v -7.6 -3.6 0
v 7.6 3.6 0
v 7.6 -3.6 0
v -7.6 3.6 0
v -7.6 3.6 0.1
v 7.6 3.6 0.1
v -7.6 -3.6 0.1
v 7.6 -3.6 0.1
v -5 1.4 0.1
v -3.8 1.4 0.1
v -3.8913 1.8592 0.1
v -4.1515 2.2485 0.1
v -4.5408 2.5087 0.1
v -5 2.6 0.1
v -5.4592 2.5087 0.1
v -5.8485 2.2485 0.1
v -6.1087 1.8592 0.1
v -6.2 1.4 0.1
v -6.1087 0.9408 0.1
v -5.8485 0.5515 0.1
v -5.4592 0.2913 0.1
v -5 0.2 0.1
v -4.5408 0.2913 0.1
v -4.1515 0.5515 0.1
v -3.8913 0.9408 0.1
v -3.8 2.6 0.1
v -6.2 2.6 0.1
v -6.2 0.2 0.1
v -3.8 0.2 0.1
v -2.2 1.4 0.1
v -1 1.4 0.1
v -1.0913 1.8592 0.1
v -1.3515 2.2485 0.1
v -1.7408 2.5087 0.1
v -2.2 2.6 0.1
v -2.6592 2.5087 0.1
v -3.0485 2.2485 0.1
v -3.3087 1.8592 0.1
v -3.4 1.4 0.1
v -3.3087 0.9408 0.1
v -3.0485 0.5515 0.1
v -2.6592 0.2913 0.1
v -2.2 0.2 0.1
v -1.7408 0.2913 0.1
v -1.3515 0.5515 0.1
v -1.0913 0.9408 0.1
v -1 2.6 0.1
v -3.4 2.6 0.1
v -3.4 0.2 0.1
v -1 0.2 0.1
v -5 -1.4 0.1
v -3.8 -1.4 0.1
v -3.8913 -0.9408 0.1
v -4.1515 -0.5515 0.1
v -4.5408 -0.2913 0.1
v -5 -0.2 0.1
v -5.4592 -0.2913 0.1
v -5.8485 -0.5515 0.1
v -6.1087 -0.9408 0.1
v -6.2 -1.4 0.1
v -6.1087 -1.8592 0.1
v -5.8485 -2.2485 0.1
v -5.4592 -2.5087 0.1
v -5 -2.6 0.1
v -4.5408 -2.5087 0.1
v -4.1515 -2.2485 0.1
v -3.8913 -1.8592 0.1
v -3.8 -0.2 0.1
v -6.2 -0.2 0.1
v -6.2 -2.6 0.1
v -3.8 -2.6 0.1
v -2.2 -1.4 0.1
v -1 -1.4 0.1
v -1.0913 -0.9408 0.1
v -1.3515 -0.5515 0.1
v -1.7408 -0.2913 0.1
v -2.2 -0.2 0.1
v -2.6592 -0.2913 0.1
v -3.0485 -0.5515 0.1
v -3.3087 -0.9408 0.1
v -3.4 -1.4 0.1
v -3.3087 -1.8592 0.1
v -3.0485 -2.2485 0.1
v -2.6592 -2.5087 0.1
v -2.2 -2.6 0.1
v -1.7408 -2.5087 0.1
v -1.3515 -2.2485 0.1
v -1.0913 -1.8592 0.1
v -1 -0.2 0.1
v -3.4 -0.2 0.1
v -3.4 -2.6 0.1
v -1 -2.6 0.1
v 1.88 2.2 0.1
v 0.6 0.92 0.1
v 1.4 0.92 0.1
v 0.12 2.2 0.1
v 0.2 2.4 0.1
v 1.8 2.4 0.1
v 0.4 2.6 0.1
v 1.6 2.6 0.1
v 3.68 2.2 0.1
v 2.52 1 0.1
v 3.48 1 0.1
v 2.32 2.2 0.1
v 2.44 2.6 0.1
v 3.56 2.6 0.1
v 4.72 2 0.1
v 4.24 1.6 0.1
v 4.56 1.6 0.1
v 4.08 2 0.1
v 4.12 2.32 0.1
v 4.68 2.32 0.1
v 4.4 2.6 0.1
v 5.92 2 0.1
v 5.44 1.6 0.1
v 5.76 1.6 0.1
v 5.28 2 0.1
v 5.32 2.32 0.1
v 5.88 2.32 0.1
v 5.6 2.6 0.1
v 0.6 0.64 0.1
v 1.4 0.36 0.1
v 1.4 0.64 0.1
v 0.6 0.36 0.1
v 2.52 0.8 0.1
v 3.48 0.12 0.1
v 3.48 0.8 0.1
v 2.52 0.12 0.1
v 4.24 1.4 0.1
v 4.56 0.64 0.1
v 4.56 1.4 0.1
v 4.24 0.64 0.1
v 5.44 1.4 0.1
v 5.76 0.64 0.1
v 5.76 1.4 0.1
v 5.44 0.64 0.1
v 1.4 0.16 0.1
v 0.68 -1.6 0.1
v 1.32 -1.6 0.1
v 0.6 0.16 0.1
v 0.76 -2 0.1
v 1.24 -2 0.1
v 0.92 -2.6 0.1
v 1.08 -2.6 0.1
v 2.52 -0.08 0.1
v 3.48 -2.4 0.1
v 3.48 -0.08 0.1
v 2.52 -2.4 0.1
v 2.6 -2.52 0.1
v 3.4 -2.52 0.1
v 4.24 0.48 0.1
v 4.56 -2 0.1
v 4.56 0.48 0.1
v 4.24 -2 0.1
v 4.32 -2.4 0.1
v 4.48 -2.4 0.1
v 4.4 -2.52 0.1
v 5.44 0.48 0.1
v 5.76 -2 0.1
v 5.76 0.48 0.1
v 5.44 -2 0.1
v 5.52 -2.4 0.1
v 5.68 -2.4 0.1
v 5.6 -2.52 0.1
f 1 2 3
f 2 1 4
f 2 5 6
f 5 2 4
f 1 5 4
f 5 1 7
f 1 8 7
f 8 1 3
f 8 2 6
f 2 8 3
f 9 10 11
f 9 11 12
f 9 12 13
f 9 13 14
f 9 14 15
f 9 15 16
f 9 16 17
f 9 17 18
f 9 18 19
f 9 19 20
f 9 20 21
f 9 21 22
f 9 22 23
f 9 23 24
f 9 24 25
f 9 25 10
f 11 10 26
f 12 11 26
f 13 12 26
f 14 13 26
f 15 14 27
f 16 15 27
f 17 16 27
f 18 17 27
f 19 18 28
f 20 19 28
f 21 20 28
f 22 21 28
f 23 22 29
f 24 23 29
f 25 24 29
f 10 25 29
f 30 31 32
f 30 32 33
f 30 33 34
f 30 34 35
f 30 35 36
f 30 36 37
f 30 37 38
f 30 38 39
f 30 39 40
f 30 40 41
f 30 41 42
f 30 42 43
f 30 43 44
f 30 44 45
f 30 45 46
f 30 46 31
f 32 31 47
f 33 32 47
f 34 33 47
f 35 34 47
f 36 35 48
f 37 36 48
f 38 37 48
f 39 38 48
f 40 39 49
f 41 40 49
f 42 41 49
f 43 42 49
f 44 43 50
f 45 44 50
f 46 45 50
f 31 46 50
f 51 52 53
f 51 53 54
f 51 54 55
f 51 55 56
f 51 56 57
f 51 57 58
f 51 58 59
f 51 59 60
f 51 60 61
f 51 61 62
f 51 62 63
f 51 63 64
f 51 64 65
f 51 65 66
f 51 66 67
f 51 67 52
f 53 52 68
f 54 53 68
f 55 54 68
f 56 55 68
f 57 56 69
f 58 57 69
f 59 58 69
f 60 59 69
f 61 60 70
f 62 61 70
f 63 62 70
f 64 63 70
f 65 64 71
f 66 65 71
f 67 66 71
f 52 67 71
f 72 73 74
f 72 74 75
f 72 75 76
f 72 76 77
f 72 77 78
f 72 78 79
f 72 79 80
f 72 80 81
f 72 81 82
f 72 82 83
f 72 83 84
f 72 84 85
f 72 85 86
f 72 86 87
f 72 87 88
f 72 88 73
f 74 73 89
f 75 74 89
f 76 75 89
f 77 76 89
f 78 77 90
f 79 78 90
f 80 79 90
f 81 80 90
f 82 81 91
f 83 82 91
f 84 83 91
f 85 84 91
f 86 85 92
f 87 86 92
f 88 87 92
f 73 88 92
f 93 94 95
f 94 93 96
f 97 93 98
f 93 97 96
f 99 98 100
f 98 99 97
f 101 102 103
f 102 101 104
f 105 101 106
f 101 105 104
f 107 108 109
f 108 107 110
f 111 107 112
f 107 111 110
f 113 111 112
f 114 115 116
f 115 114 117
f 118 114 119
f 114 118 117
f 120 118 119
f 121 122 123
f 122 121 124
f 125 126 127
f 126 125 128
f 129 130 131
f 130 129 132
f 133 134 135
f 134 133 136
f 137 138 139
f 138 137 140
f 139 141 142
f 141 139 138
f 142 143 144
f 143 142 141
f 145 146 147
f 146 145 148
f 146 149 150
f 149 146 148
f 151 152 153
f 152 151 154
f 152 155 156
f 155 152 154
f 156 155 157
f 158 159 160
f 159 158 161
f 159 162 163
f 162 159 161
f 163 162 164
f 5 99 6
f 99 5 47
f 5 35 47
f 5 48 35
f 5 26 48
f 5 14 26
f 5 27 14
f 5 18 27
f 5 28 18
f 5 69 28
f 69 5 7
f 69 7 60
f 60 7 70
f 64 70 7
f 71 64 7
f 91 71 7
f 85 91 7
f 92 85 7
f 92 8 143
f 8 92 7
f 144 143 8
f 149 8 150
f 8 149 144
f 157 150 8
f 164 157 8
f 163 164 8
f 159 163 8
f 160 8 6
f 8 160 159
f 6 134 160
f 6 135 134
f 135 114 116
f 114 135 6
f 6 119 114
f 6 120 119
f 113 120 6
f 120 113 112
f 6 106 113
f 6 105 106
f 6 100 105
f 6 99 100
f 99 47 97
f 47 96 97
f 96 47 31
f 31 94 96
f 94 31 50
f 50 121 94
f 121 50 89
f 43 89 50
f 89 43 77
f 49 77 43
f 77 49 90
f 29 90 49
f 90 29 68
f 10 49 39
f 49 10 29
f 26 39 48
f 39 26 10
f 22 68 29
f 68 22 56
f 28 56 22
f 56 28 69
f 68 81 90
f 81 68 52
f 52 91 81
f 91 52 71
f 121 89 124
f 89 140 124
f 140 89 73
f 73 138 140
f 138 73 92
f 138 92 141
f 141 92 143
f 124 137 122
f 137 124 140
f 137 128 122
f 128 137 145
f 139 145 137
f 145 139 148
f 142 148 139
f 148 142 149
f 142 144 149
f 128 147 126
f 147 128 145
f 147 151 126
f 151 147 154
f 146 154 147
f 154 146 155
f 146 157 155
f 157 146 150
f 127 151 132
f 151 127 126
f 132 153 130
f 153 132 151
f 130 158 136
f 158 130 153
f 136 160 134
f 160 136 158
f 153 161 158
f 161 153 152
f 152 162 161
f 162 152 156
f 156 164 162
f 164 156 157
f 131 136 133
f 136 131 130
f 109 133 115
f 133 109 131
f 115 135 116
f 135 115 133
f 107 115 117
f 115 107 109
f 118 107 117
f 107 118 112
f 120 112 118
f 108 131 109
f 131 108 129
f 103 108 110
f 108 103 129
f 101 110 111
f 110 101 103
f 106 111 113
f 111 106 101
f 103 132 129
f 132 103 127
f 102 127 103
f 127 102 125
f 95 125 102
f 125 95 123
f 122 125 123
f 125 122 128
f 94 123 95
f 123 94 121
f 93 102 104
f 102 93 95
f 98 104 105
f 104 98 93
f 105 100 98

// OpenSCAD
// file: ../p/box5-12.scad
use <../lib.scad>
function ldraw_lib__box5_12() = [
// 0 Box with 5 Faces without Any Edges
// 0 Name: box5-12.dat
// 0 Author: Chris Dee [cwdee]
// 0 !LDRAW_ORG Primitive UPDATE 2009-02
// 0 !LICENSE Licensed under CC BY 4.0 : see CAreadme.txt
// 
// 0 BFC CERTIFY CCW
  [0,"BFC","CERTIFY"],
  [0,"BFC","CCW"],
// 
// 0 !HISTORY 2009-09-03 [PTadmin] Official Update 2009-02
// 
// 
// 4 16 1 1 1 1 1 -1 -1 1 -1 -1 1 1
  [4,16,1,1,1,1,1,-1,-1,1,-1,-1,1,1],
// 4 16 -1 0 1 1 0 1 1 1 1 -1 1 1
  [4,16,-1,0,1,1,0,1,1,1,1,-1,1,1],
// 4 16 -1 0 -1 -1 0 1 -1 1 1 -1 1 -1
  [4,16,-1,0,-1,-1,0,1,-1,1,1,-1,1,-1],
// 4 16 1 0 -1 -1 0 -1 -1 1 -1 1 1 -1
  [4,16,1,0,-1,-1,0,-1,-1,1,-1,1,1,-1],
// 4 16 1 0 1 1 0 -1 1 1 -1 1 1 1
  [4,16,1,0,1,1,0,-1,1,1,-1,1,1,1],
// 0
];
module ldraw_lib__box5_12(step=0, col=false, unit=2/5, alt=false, line=0.2, solid=!$preview)
    makepoly(ldraw_lib__box5_12(), step=step, col=col, unit=unit, alt=alt, line=line, solid=solid);
ldraw_lib__box5_12(line=0.2);
// file: ../p/4-4ndis.scad
use <../lib.scad>
function ldraw_lib__4_4ndis() = [
// 0 Disc Negative 1.0
// 0 Name: 4-4ndis.dat
// 0 Author: James Jessiman
// 0 !LDRAW_ORG Primitive UPDATE 2012-01
// 0 !LICENSE Licensed under CC BY 4.0 : see CAreadme.txt
// 
// 0 BFC CERTIFY CCW
  [0,"BFC","CERTIFY"],
  [0,"BFC","CCW"],
// 
// 0 !HISTORY 2002-03-23 [sbliss] Added BFC statement; compacted code
// 0 !HISTORY 2002-04-25 [PTadmin] Official Update 2002-02
// 0 !HISTORY 2007-06-24 [PTadmin] Header formatted for Contributor Agreement
// 0 !HISTORY 2008-07-01 [PTadmin] Official Update 2008-01
// 0 !HISTORY 2012-02-16 [Philo] Changed to CCW
// 0 !HISTORY 2012-03-30 [PTadmin] Official Update 2012-01
// 
// 
// 3 16 0.9239 0 0.3827 1 0 0 1 0 1
  [3,16,0.9239,0,0.3827,1,0,0,1,0,1],
// 3 16 0.7071 0 0.7071 0.9239 0 0.3827 1 0 1
  [3,16,0.7071,0,0.7071,0.9239,0,0.3827,1,0,1],
// 3 16 0.3827 0 0.9239 0.7071 0 0.7071 1 0 1
  [3,16,0.3827,0,0.9239,0.7071,0,0.7071,1,0,1],
// 3 16 0 0 1 0.3827 0 0.9239 1 0 1
  [3,16,0,0,1,0.3827,0,0.9239,1,0,1],
// 3 16 -0.3827 0 0.9239 0 0 1 -1 0 1
  [3,16,-0.3827,0,0.9239,0,0,1,-1,0,1],
// 3 16 -0.7071 0 0.7071 -0.3827 0 0.9239 -1 0 1
  [3,16,-0.7071,0,0.7071,-0.3827,0,0.9239,-1,0,1],
// 3 16 -0.9239 0 0.3827 -0.7071 0 0.7071 -1 0 1
  [3,16,-0.9239,0,0.3827,-0.7071,0,0.7071,-1,0,1],
// 3 16 -1 0 0 -0.9239 0 0.3827 -1 0 1
  [3,16,-1,0,0,-0.9239,0,0.3827,-1,0,1],
// 3 16 -0.9239 0 -0.3827 -1 0 0 -1 0 -1
  [3,16,-0.9239,0,-0.3827,-1,0,0,-1,0,-1],
// 3 16 -0.7071 0 -0.7071 -0.9239 0 -0.3827 -1 0 -1
  [3,16,-0.7071,0,-0.7071,-0.9239,0,-0.3827,-1,0,-1],
// 3 16 -0.3827 0 -0.9239 -0.7071 0 -0.7071 -1 0 -1
  [3,16,-0.3827,0,-0.9239,-0.7071,0,-0.7071,-1,0,-1],
// 3 16 0 0 -1 -0.3827 0 -0.9239 -1 0 -1
  [3,16,0,0,-1,-0.3827,0,-0.9239,-1,0,-1],
// 3 16 0.3827 0 -0.9239 0 0 -1 1 0 -1
  [3,16,0.3827,0,-0.9239,0,0,-1,1,0,-1],
// 3 16 0.7071 0 -0.7071 0.3827 0 -0.9239 1 0 -1
  [3,16,0.7071,0,-0.7071,0.3827,0,-0.9239,1,0,-1],
// 3 16 0.9239 0 -0.3827 0.7071 0 -0.7071 1 0 -1
  [3,16,0.9239,0,-0.3827,0.7071,0,-0.7071,1,0,-1],
// 3 16 1 0 0 0.9239 0 -0.3827 1 0 -1
  [3,16,1,0,0,0.9239,0,-0.3827,1,0,-1],
];
module ldraw_lib__4_4ndis(step=0, col=false, unit=2/5, alt=false, line=0.2, solid=!$preview)
    makepoly(ldraw_lib__4_4ndis(), step=step, col=col, unit=unit, alt=alt, line=line, solid=solid);
ldraw_lib__4_4ndis(line=0.2);
// file: ../p/4-4disc.scad
use <../lib.scad>
function ldraw_lib__4_4disc() = [
// 0 Disc 1.0
// 0 Name: 4-4disc.dat
// 0 Author: James Jessiman
// 0 !LDRAW_ORG Primitive UPDATE 2002-02
// 0 !LICENSE Licensed under CC BY 4.0 : see CAreadme.txt
// 
// 0 BFC CERTIFY CCW
  [0,"BFC","CERTIFY"],
  [0,"BFC","CCW"],
// 
// 0 !HISTORY 1998-12-15 [PTadmin] Official Update 1998-10
// 0 !HISTORY 2002-03-23 [sbliss] Added BFC statement
// 0 !HISTORY 2002-04-25 [PTadmin] Official Update 2002-02
// 0 !HISTORY 2007-06-24 [PTadmin] Header formatted for Contributor Agreement
// 0 !HISTORY 2008-07-01 [PTadmin] Official Update 2008-01
// 
// 
// 3 16 0 0 0 1 0 0 0.9239 0 0.3827
  [3,16,0,0,0,1,0,0,0.9239,0,0.3827],
// 3 16 0 0 0 0.9239 0 0.3827 0.7071 0 0.7071
  [3,16,0,0,0,0.9239,0,0.3827,0.7071,0,0.7071],
// 3 16 0 0 0 0.7071 0 0.7071 0.3827 0 0.9239
  [3,16,0,0,0,0.7071,0,0.7071,0.3827,0,0.9239],
// 3 16 0 0 0 0.3827 0 0.9239 0 0 1
  [3,16,0,0,0,0.3827,0,0.9239,0,0,1],
// 3 16 0 0 0 0 0 1 -0.3827 0 0.9239
  [3,16,0,0,0,0,0,1,-0.3827,0,0.9239],
// 3 16 0 0 0 -0.3827 0 0.9239 -0.7071 0 0.7071
  [3,16,0,0,0,-0.3827,0,0.9239,-0.7071,0,0.7071],
// 3 16 0 0 0 -0.7071 0 0.7071 -0.9239 0 0.3827
  [3,16,0,0,0,-0.7071,0,0.7071,-0.9239,0,0.3827],
// 3 16 0 0 0 -0.9239 0 0.3827 -1 0 -0
  [3,16,0,0,0,-0.9239,0,0.3827,-1,0,-0],
// 3 16 0 0 0 -1 0 -0 -0.9239 0 -0.3827
  [3,16,0,0,0,-1,0,-0,-0.9239,0,-0.3827],
// 3 16 0 0 0 -0.9239 0 -0.3827 -0.7071 0 -0.7071
  [3,16,0,0,0,-0.9239,0,-0.3827,-0.7071,0,-0.7071],
// 3 16 0 0 0 -0.7071 0 -0.7071 -0.3827 0 -0.9239
  [3,16,0,0,0,-0.7071,0,-0.7071,-0.3827,0,-0.9239],
// 3 16 0 0 0 -0.3827 0 -0.9239 0 0 -1
  [3,16,0,0,0,-0.3827,0,-0.9239,0,0,-1],
// 3 16 0 0 0 0 0 -1 0.3827 0 -0.9239
  [3,16,0,0,0,0,0,-1,0.3827,0,-0.9239],
// 3 16 0 0 0 0.3827 0 -0.9239 0.7071 0 -0.7071
  [3,16,0,0,0,0.3827,0,-0.9239,0.7071,0,-0.7071],
// 3 16 0 0 0 0.7071 0 -0.7071 0.9239 0 -0.3827
  [3,16,0,0,0,0.7071,0,-0.7071,0.9239,0,-0.3827],
// 3 16 0 0 0 0.9239 0 -0.3827 1 0 0
  [3,16,0,0,0,0.9239,0,-0.3827,1,0,0],
// 0
];
module ldraw_lib__4_4disc(step=0, col=false, unit=2/5, alt=false, line=0.2, solid=!$preview)
    makepoly(ldraw_lib__4_4disc(), step=step, col=col, unit=unit, alt=alt, line=line, solid=solid);
ldraw_lib__4_4disc(line=0.2);
// main file
use <../lib.scad>
use <../p/4-4disc.scad>
use <../p/4-4ndis.scad>
use <../p/box5-12.scad>
function ldraw_lib__4620858k() = [
// 0 Sticker  0.9 x  1.9 with Paintbox and Makeup Brushes
// 0 Name: 4620858k.dat
// 0 Author: Takeshi Takahashi [RainbowDolphin]
// 0 !LDRAW_ORG Part UPDATE 2024-08
// 0 !LICENSE Licensed under CC BY 4.0 : see CAreadme.txt
// 
// 0 BFC CERTIFY CCW
  [0,"BFC","CERTIFY"],
  [0,"BFC","CCW"],
// 
// 0 !KEYWORDS Beauty Shop, Cosmetics, set 3187
// 
// 0 !HISTORY 2024-09-30 [OrionP] Official Update 2024-08
// 
// 
// 1 16 0 -0.25 0 19 0 0 0 0.25 0 0 0 9 box5-12.dat
  [1,16,0,-0.25,0,19,0,0,0,0.25,0,0,0,9, ldraw_lib__box5_12()],
// 1 78 -12.5 -0.25 3.5 3 0 0 0 1 0 0 0 3 4-4disc.dat
  [1,78,-12.5,-0.25,3.5,3,0,0,0,1,0,0,0,3, ldraw_lib__4_4disc()],
// 1 15 -12.5 -0.25 3.5 3 0 0 0 1 0 0 0 3 4-4ndis.dat
  [1,15,-12.5,-0.25,3.5,3,0,0,0,1,0,0,0,3, ldraw_lib__4_4ndis()],
// 1 322 -5.5 -0.25 3.5 3 0 0 0 1 0 0 0 3 4-4disc.dat
  [1,322,-5.5,-0.25,3.5,3,0,0,0,1,0,0,0,3, ldraw_lib__4_4disc()],
// 1 15 -5.5 -0.25 3.5 3 0 0 0 1 0 0 0 3 4-4ndis.dat
  [1,15,-5.5,-0.25,3.5,3,0,0,0,1,0,0,0,3, ldraw_lib__4_4ndis()],
// 1 70 -12.5 -0.25 -3.5 3 0 0 0 1 0 0 0 3 4-4disc.dat
  [1,70,-12.5,-0.25,-3.5,3,0,0,0,1,0,0,0,3, ldraw_lib__4_4disc()],
// 1 15 -12.5 -0.25 -3.5 3 0 0 0 1 0 0 0 3 4-4ndis.dat
  [1,15,-12.5,-0.25,-3.5,3,0,0,0,1,0,0,0,3, ldraw_lib__4_4ndis()],
// 1 29 -5.5 -0.25 -3.5 3 0 0 0 1 0 0 0 3 4-4disc.dat
  [1,29,-5.5,-0.25,-3.5,3,0,0,0,1,0,0,0,3, ldraw_lib__4_4disc()],
// 1 15 -5.5 -0.25 -3.5 3 0 0 0 1 0 0 0 3 4-4ndis.dat
  [1,15,-5.5,-0.25,-3.5,3,0,0,0,1,0,0,0,3, ldraw_lib__4_4ndis()],
// 4 29 0.3 -0.25 5.5 1.5 -0.25 2.3 3.5 -0.25 2.3 4.7 -0.25 5.5
  [4,29,0.3,-0.25,5.5,1.5,-0.25,2.3,3.5,-0.25,2.3,4.7,-0.25,5.5],
// 4 29 0.5 -0.25 6 0.3 -0.25 5.5 4.7 -0.25 5.5 4.5 -0.25 6
  [4,29,0.5,-0.25,6,0.3,-0.25,5.5,4.7,-0.25,5.5,4.5,-0.25,6],
// 4 29 1 -0.25 6.5 0.5 -0.25 6 4.5 -0.25 6 4 -0.25 6.5
  [4,29,1,-0.25,6.5,0.5,-0.25,6,4.5,-0.25,6,4,-0.25,6.5],
// 4 29 5.8 -0.25 5.5 6.3 -0.25 2.5 8.7 -0.25 2.5 9.2 -0.25 5.5
  [4,29,5.8,-0.25,5.5,6.3,-0.25,2.5,8.7,-0.25,2.5,9.2,-0.25,5.5],
// 4 29 6.1 -0.25 6.5 5.8 -0.25 5.5 9.2 -0.25 5.5 8.9 -0.25 6.5
  [4,29,6.1,-0.25,6.5,5.8,-0.25,5.5,9.2,-0.25,5.5,8.9,-0.25,6.5],
// 4 29 10.2 -0.25 5 10.6 -0.25 4 11.4 -0.25 4 11.8 -0.25 5
  [4,29,10.2,-0.25,5,10.6,-0.25,4,11.4,-0.25,4,11.8,-0.25,5],
// 4 29 10.3 -0.25 5.8 10.2 -0.25 5 11.8 -0.25 5 11.7 -0.25 5.8
  [4,29,10.3,-0.25,5.8,10.2,-0.25,5,11.8,-0.25,5,11.7,-0.25,5.8],
// 3 29 11 -0.25 6.5 10.3 -0.25 5.8 11.7 -0.25 5.8
  [3,29,11,-0.25,6.5,10.3,-0.25,5.8,11.7,-0.25,5.8],
// 4 29 13.2 -0.25 5 13.6 -0.25 4 14.4 -0.25 4 14.8 -0.25 5
  [4,29,13.2,-0.25,5,13.6,-0.25,4,14.4,-0.25,4,14.8,-0.25,5],
// 4 29 13.3 -0.25 5.8 13.2 -0.25 5 14.8 -0.25 5 14.7 -0.25 5.8
  [4,29,13.3,-0.25,5.8,13.2,-0.25,5,14.8,-0.25,5,14.7,-0.25,5.8],
// 3 29 14 -0.25 6.5 13.3 -0.25 5.8 14.7 -0.25 5.8
  [3,29,14,-0.25,6.5,13.3,-0.25,5.8,14.7,-0.25,5.8],
// 4 78 3.5 -0.25 1.6 1.5 -0.25 1.6 1.5 -0.25 0.9 3.5 -0.25 0.9
  [4,78,3.5,-0.25,1.6,1.5,-0.25,1.6,1.5,-0.25,0.9,3.5,-0.25,0.9],
// 4 78 8.7 -0.25 2 6.3 -0.25 2 6.3 -0.25 0.3 8.7 -0.25 0.3
  [4,78,8.7,-0.25,2,6.3,-0.25,2,6.3,-0.25,0.3,8.7,-0.25,0.3],
// 4 78 11.4 -0.25 3.5 10.6 -0.25 3.5 10.6 -0.25 1.6 11.4 -0.25 1.6
  [4,78,11.4,-0.25,3.5,10.6,-0.25,3.5,10.6,-0.25,1.6,11.4,-0.25,1.6],
// 4 78 14.4 -0.25 3.5 13.6 -0.25 3.5 13.6 -0.25 1.6 14.4 -0.25 1.6
  [4,78,14.4,-0.25,3.5,13.6,-0.25,3.5,13.6,-0.25,1.6,14.4,-0.25,1.6],
// 4 383 3.5 -0.25 0.4 1.5 -0.25 0.4 1.7 -0.25 -4 3.3 -0.25 -4
  [4,383,3.5,-0.25,0.4,1.5,-0.25,0.4,1.7,-0.25,-4,3.3,-0.25,-4],
// 4 383 3.3 -0.25 -4 1.7 -0.25 -4 1.9 -0.25 -5 3.1 -0.25 -5
  [4,383,3.3,-0.25,-4,1.7,-0.25,-4,1.9,-0.25,-5,3.1,-0.25,-5],
// 4 383 3.1 -0.25 -5 1.9 -0.25 -5 2.3 -0.25 -6.5 2.7 -0.25 -6.5
  [4,383,3.1,-0.25,-5,1.9,-0.25,-5,2.3,-0.25,-6.5,2.7,-0.25,-6.5],
// 4 383 8.7 -0.25 -0.2 6.3 -0.25 -0.2 6.3 -0.25 -6 8.7 -0.25 -6
  [4,383,8.7,-0.25,-0.2,6.3,-0.25,-0.2,6.3,-0.25,-6,8.7,-0.25,-6],
// 4 383 8.7 -0.25 -6 6.3 -0.25 -6 6.5 -0.25 -6.3 8.5 -0.25 -6.3
  [4,383,8.7,-0.25,-6,6.3,-0.25,-6,6.5,-0.25,-6.3,8.5,-0.25,-6.3],
// 4 383 11.4 -0.25 1.2 10.6 -0.25 1.2 10.6 -0.25 -5 11.4 -0.25 -5
  [4,383,11.4,-0.25,1.2,10.6,-0.25,1.2,10.6,-0.25,-5,11.4,-0.25,-5],
// 4 383 11.4 -0.25 -5 10.6 -0.25 -5 10.8 -0.25 -6 11.2 -0.25 -6
  [4,383,11.4,-0.25,-5,10.6,-0.25,-5,10.8,-0.25,-6,11.2,-0.25,-6],
// 3 383 11.2 -0.25 -6 10.8 -0.25 -6 11 -0.25 -6.3
  [3,383,11.2,-0.25,-6,10.8,-0.25,-6,11,-0.25,-6.3],
// 4 383 14.4 -0.25 1.2 13.6 -0.25 1.2 13.6 -0.25 -5 14.4 -0.25 -5
  [4,383,14.4,-0.25,1.2,13.6,-0.25,1.2,13.6,-0.25,-5,14.4,-0.25,-5],
// 4 383 14.4 -0.25 -5 13.6 -0.25 -5 13.8 -0.25 -6 14.2 -0.25 -6
  [4,383,14.4,-0.25,-5,13.6,-0.25,-5,13.8,-0.25,-6,14.2,-0.25,-6],
// 3 383 14.2 -0.25 -6 13.8 -0.25 -6 14 -0.25 -6.3
  [3,383,14.2,-0.25,-6,13.8,-0.25,-6,14,-0.25,-6.3],
// 4 15 1 -0.25 6.5 19 -0.25 9 -19 -0.25 9 -2.5 -0.25 6.5
  [4,15,1,-0.25,6.5,19,-0.25,9,-19,-0.25,9,-2.5,-0.25,6.5],
// 3 15 -19 -0.25 9 -5.5 -0.25 6.5 -2.5 -0.25 6.5
  [3,15,-19,-0.25,9,-5.5,-0.25,6.5,-2.5,-0.25,6.5],
// 3 15 -19 -0.25 9 -8.5 -0.25 6.5 -5.5 -0.25 6.5
  [3,15,-19,-0.25,9,-8.5,-0.25,6.5,-5.5,-0.25,6.5],
// 3 15 -19 -0.25 9 -9.5 -0.25 6.5 -8.5 -0.25 6.5
  [3,15,-19,-0.25,9,-9.5,-0.25,6.5,-8.5,-0.25,6.5],
// 3 15 -19 -0.25 9 -12.5 -0.25 6.5 -9.5 -0.25 6.5
  [3,15,-19,-0.25,9,-12.5,-0.25,6.5,-9.5,-0.25,6.5],
// 3 15 -19 -0.25 9 -15.5 -0.25 6.5 -12.5 -0.25 6.5
  [3,15,-19,-0.25,9,-15.5,-0.25,6.5,-12.5,-0.25,6.5],
// 3 15 -19 -0.25 9 -15.5 -0.25 3.5 -15.5 -0.25 6.5
  [3,15,-19,-0.25,9,-15.5,-0.25,3.5,-15.5,-0.25,6.5],
// 3 15 -19 -0.25 9 -15.5 -0.25 0.5 -15.5 -0.25 3.5
  [3,15,-19,-0.25,9,-15.5,-0.25,0.5,-15.5,-0.25,3.5],
// 4 15 -15.5 -0.25 -0.5 -15.5 -0.25 0.5 -19 -0.25 9 -19 -0.25 -9
  [4,15,-15.5,-0.25,-0.5,-15.5,-0.25,0.5,-19,-0.25,9,-19,-0.25,-9],
// 3 15 -15.5 -0.25 -0.5 -19 -0.25 -9 -15.5 -0.25 -3.5
  [3,15,-15.5,-0.25,-0.5,-19,-0.25,-9,-15.5,-0.25,-3.5],
// 3 15 -15.5 -0.25 -3.5 -19 -0.25 -9 -15.5 -0.25 -6.5
  [3,15,-15.5,-0.25,-3.5,-19,-0.25,-9,-15.5,-0.25,-6.5],
// 3 15 -12.5 -0.25 -6.5 -15.5 -0.25 -6.5 -19 -0.25 -9
  [3,15,-12.5,-0.25,-6.5,-15.5,-0.25,-6.5,-19,-0.25,-9],
// 3 15 -9.5 -0.25 -6.5 -12.5 -0.25 -6.5 -19 -0.25 -9
  [3,15,-9.5,-0.25,-6.5,-12.5,-0.25,-6.5,-19,-0.25,-9],
// 3 15 -8.5 -0.25 -6.5 -9.5 -0.25 -6.5 -19 -0.25 -9
  [3,15,-8.5,-0.25,-6.5,-9.5,-0.25,-6.5,-19,-0.25,-9],
// 3 15 -5.5 -0.25 -6.5 -8.5 -0.25 -6.5 -19 -0.25 -9
  [3,15,-5.5,-0.25,-6.5,-8.5,-0.25,-6.5,-19,-0.25,-9],
// 3 15 -2.5 -0.25 -6.5 -5.5 -0.25 -6.5 -19 -0.25 -9
  [3,15,-2.5,-0.25,-6.5,-5.5,-0.25,-6.5,-19,-0.25,-9],
// 4 15 2.3 -0.25 -6.5 -2.5 -0.25 -6.5 -19 -0.25 -9 19 -0.25 -9
  [4,15,2.3,-0.25,-6.5,-2.5,-0.25,-6.5,-19,-0.25,-9,19,-0.25,-9],
// 3 15 2.7 -0.25 -6.5 2.3 -0.25 -6.5 19 -0.25 -9
  [3,15,2.7,-0.25,-6.5,2.3,-0.25,-6.5,19,-0.25,-9],
// 4 15 6.5 -0.25 -6.3 2.7 -0.25 -6.5 19 -0.25 -9 8.5 -0.25 -6.3
  [4,15,6.5,-0.25,-6.3,2.7,-0.25,-6.5,19,-0.25,-9,8.5,-0.25,-6.3],
// 3 15 11 -0.25 -6.3 8.5 -0.25 -6.3 19 -0.25 -9
  [3,15,11,-0.25,-6.3,8.5,-0.25,-6.3,19,-0.25,-9],
// 3 15 14 -0.25 -6.3 11 -0.25 -6.3 19 -0.25 -9
  [3,15,14,-0.25,-6.3,11,-0.25,-6.3,19,-0.25,-9],
// 3 15 14.2 -0.25 -6 14 -0.25 -6.3 19 -0.25 -9
  [3,15,14.2,-0.25,-6,14,-0.25,-6.3,19,-0.25,-9],
// 3 15 14.4 -0.25 -5 14.2 -0.25 -6 19 -0.25 -9
  [3,15,14.4,-0.25,-5,14.2,-0.25,-6,19,-0.25,-9],
// 4 15 14.4 -0.25 1.2 14.4 -0.25 -5 19 -0.25 -9 19 -0.25 9
  [4,15,14.4,-0.25,1.2,14.4,-0.25,-5,19,-0.25,-9,19,-0.25,9],
// 3 15 19 -0.25 9 14.4 -0.25 1.6 14.4 -0.25 1.2
  [3,15,19,-0.25,9,14.4,-0.25,1.6,14.4,-0.25,1.2],
// 3 15 19 -0.25 9 14.4 -0.25 3.5 14.4 -0.25 1.6
  [3,15,19,-0.25,9,14.4,-0.25,3.5,14.4,-0.25,1.6],
// 4 15 14.4 -0.25 4 14.4 -0.25 3.5 19 -0.25 9 14.8 -0.25 5
  [4,15,14.4,-0.25,4,14.4,-0.25,3.5,19,-0.25,9,14.8,-0.25,5],
// 3 15 19 -0.25 9 14.7 -0.25 5.8 14.8 -0.25 5
  [3,15,19,-0.25,9,14.7,-0.25,5.8,14.8,-0.25,5],
// 3 15 19 -0.25 9 14 -0.25 6.5 14.7 -0.25 5.8
  [3,15,19,-0.25,9,14,-0.25,6.5,14.7,-0.25,5.8],
// 4 15 14 -0.25 6.5 19 -0.25 9 11 -0.25 6.5 11.7 -0.25 5.8
  [4,15,14,-0.25,6.5,19,-0.25,9,11,-0.25,6.5,11.7,-0.25,5.8],
// 3 15 19 -0.25 9 8.9 -0.25 6.5 11 -0.25 6.5
  [3,15,19,-0.25,9,8.9,-0.25,6.5,11,-0.25,6.5],
// 3 15 19 -0.25 9 6.1 -0.25 6.5 8.9 -0.25 6.5
  [3,15,19,-0.25,9,6.1,-0.25,6.5,8.9,-0.25,6.5],
// 3 15 19 -0.25 9 4 -0.25 6.5 6.1 -0.25 6.5
  [3,15,19,-0.25,9,4,-0.25,6.5,6.1,-0.25,6.5],
// 3 15 19 -0.25 9 1 -0.25 6.5 4 -0.25 6.5
  [3,15,19,-0.25,9,1,-0.25,6.5,4,-0.25,6.5],
// 3 15 1 -0.25 6.5 -2.5 -0.25 6.5 0.5 -0.25 6
  [3,15,1,-0.25,6.5,-2.5,-0.25,6.5,0.5,-0.25,6],
// 4 15 0.3 -0.25 5.5 0.5 -0.25 6 -2.5 -0.25 6.5 -2.5 -0.25 3.5
  [4,15,0.3,-0.25,5.5,0.5,-0.25,6,-2.5,-0.25,6.5,-2.5,-0.25,3.5],
// 4 15 1.5 -0.25 2.3 0.3 -0.25 5.5 -2.5 -0.25 3.5 -2.5 -0.25 0.5
  [4,15,1.5,-0.25,2.3,0.3,-0.25,5.5,-2.5,-0.25,3.5,-2.5,-0.25,0.5],
// 4 15 1.5 -0.25 1.6 1.5 -0.25 2.3 -2.5 -0.25 0.5 -2.5 -0.25 -0.5
  [4,15,1.5,-0.25,1.6,1.5,-0.25,2.3,-2.5,-0.25,0.5,-2.5,-0.25,-0.5],
// 4 15 -2.5 -0.25 -0.5 -2.5 -0.25 0.5 -5.5 -0.25 0.5 -5.5 -0.25 -0.5
  [4,15,-2.5,-0.25,-0.5,-2.5,-0.25,0.5,-5.5,-0.25,0.5,-5.5,-0.25,-0.5],
// 4 15 -5.5 -0.25 -0.5 -5.5 -0.25 0.5 -8.5 -0.25 0.5 -8.5 -0.25 -0.5
  [4,15,-5.5,-0.25,-0.5,-5.5,-0.25,0.5,-8.5,-0.25,0.5,-8.5,-0.25,-0.5],
// 4 15 -8.5 -0.25 -0.5 -8.5 -0.25 0.5 -9.5 -0.25 0.5 -9.5 -0.25 -0.5
  [4,15,-8.5,-0.25,-0.5,-8.5,-0.25,0.5,-9.5,-0.25,0.5,-9.5,-0.25,-0.5],
// 4 15 -9.5 -0.25 0.5 -8.5 -0.25 0.5 -8.5 -0.25 3.5 -9.5 -0.25 3.5
  [4,15,-9.5,-0.25,0.5,-8.5,-0.25,0.5,-8.5,-0.25,3.5,-9.5,-0.25,3.5],
// 4 15 -9.5 -0.25 3.5 -8.5 -0.25 3.5 -8.5 -0.25 6.5 -9.5 -0.25 6.5
  [4,15,-9.5,-0.25,3.5,-8.5,-0.25,3.5,-8.5,-0.25,6.5,-9.5,-0.25,6.5],
// 4 15 -9.5 -0.25 -0.5 -9.5 -0.25 0.5 -12.5 -0.25 0.5 -12.5 -0.25 -0.5
  [4,15,-9.5,-0.25,-0.5,-9.5,-0.25,0.5,-12.5,-0.25,0.5,-12.5,-0.25,-0.5],
// 4 15 -12.5 -0.25 -0.5 -12.5 -0.25 0.5 -15.5 -0.25 0.5 -15.5 -0.25 -0.5
  [4,15,-12.5,-0.25,-0.5,-12.5,-0.25,0.5,-15.5,-0.25,0.5,-15.5,-0.25,-0.5],
// 4 15 -8.5 -0.25 -0.5 -9.5 -0.25 -0.5 -9.5 -0.25 -3.5 -8.5 -0.25 -3.5
  [4,15,-8.5,-0.25,-0.5,-9.5,-0.25,-0.5,-9.5,-0.25,-3.5,-8.5,-0.25,-3.5],
// 4 15 -8.5 -0.25 -3.5 -9.5 -0.25 -3.5 -9.5 -0.25 -6.5 -8.5 -0.25 -6.5
  [4,15,-8.5,-0.25,-3.5,-9.5,-0.25,-3.5,-9.5,-0.25,-6.5,-8.5,-0.25,-6.5],
// 3 15 1.5 -0.25 1.6 -2.5 -0.25 -0.5 1.5 -0.25 0.9
  [3,15,1.5,-0.25,1.6,-2.5,-0.25,-0.5,1.5,-0.25,0.9],
// 4 15 1.5 -0.25 0.4 1.5 -0.25 0.9 -2.5 -0.25 -0.5 -2.5 -0.25 -3.5
  [4,15,1.5,-0.25,0.4,1.5,-0.25,0.9,-2.5,-0.25,-0.5,-2.5,-0.25,-3.5],
// 4 15 1.7 -0.25 -4 1.5 -0.25 0.4 -2.5 -0.25 -3.5 -2.5 -0.25 -6.5
  [4,15,1.7,-0.25,-4,1.5,-0.25,0.4,-2.5,-0.25,-3.5,-2.5,-0.25,-6.5],
// 3 15 1.7 -0.25 -4 -2.5 -0.25 -6.5 1.9 -0.25 -5
  [3,15,1.7,-0.25,-4,-2.5,-0.25,-6.5,1.9,-0.25,-5],
// 3 15 1.9 -0.25 -5 -2.5 -0.25 -6.5 2.3 -0.25 -6.5
  [3,15,1.9,-0.25,-5,-2.5,-0.25,-6.5,2.3,-0.25,-6.5],
// 4 15 3.5 -0.25 0.9 1.5 -0.25 0.9 1.5 -0.25 0.4 3.5 -0.25 0.4
  [4,15,3.5,-0.25,0.9,1.5,-0.25,0.9,1.5,-0.25,0.4,3.5,-0.25,0.4],
// 4 15 6.3 -0.25 0.3 3.5 -0.25 0.9 3.5 -0.25 0.4 6.3 -0.25 -0.2
  [4,15,6.3,-0.25,0.3,3.5,-0.25,0.9,3.5,-0.25,0.4,6.3,-0.25,-0.2],
// 4 15 6.3 -0.25 -0.2 3.5 -0.25 0.4 3.3 -0.25 -4 6.3 -0.25 -6
  [4,15,6.3,-0.25,-0.2,3.5,-0.25,0.4,3.3,-0.25,-4,6.3,-0.25,-6],
// 4 15 6.3 -0.25 -6 3.3 -0.25 -4 3.1 -0.25 -5 6.5 -0.25 -6.3
  [4,15,6.3,-0.25,-6,3.3,-0.25,-4,3.1,-0.25,-5,6.5,-0.25,-6.3],
// 3 15 3.1 -0.25 -5 2.7 -0.25 -6.5 6.5 -0.25 -6.3
  [3,15,3.1,-0.25,-5,2.7,-0.25,-6.5,6.5,-0.25,-6.3],
// 4 15 8.7 -0.25 0.3 6.3 -0.25 0.3 6.3 -0.25 -0.2 8.7 -0.25 -0.2
  [4,15,8.7,-0.25,0.3,6.3,-0.25,0.3,6.3,-0.25,-0.2,8.7,-0.25,-0.2],
// 4 15 10.6 -0.25 1.2 8.7 -0.25 0.3 8.7 -0.25 -0.2 10.6 -0.25 -5
  [4,15,10.6,-0.25,1.2,8.7,-0.25,0.3,8.7,-0.25,-0.2,10.6,-0.25,-5],
// 4 15 10.6 -0.25 -5 8.7 -0.25 -0.2 8.7 -0.25 -6 10.8 -0.25 -6
  [4,15,10.6,-0.25,-5,8.7,-0.25,-0.2,8.7,-0.25,-6,10.8,-0.25,-6],
// 4 15 10.8 -0.25 -6 8.7 -0.25 -6 8.5 -0.25 -6.3 11 -0.25 -6.3
  [4,15,10.8,-0.25,-6,8.7,-0.25,-6,8.5,-0.25,-6.3,11,-0.25,-6.3],
// 4 15 8.7 -0.25 2 8.7 -0.25 0.3 10.6 -0.25 1.2 10.6 -0.25 1.6
  [4,15,8.7,-0.25,2,8.7,-0.25,0.3,10.6,-0.25,1.2,10.6,-0.25,1.6],
// 4 15 11.4 -0.25 1.6 10.6 -0.25 1.6 10.6 -0.25 1.2 11.4 -0.25 1.2
  [4,15,11.4,-0.25,1.6,10.6,-0.25,1.6,10.6,-0.25,1.2,11.4,-0.25,1.2],
// 4 15 13.6 -0.25 1.6 11.4 -0.25 1.6 11.4 -0.25 1.2 13.6 -0.25 1.2
  [4,15,13.6,-0.25,1.6,11.4,-0.25,1.6,11.4,-0.25,1.2,13.6,-0.25,1.2],
// 4 15 14.4 -0.25 1.6 13.6 -0.25 1.6 13.6 -0.25 1.2 14.4 -0.25 1.2
  [4,15,14.4,-0.25,1.6,13.6,-0.25,1.6,13.6,-0.25,1.2,14.4,-0.25,1.2],
// 4 15 13.6 -0.25 1.2 11.4 -0.25 1.2 11.4 -0.25 -5 13.6 -0.25 -5
  [4,15,13.6,-0.25,1.2,11.4,-0.25,1.2,11.4,-0.25,-5,13.6,-0.25,-5],
// 4 15 13.6 -0.25 -5 11.4 -0.25 -5 11.2 -0.25 -6 13.8 -0.25 -6
  [4,15,13.6,-0.25,-5,11.4,-0.25,-5,11.2,-0.25,-6,13.8,-0.25,-6],
// 4 15 13.8 -0.25 -6 11.2 -0.25 -6 11 -0.25 -6.3 14 -0.25 -6.3
  [4,15,13.8,-0.25,-6,11.2,-0.25,-6,11,-0.25,-6.3,14,-0.25,-6.3],
// 4 15 11.4 -0.25 3.5 11.4 -0.25 1.6 13.6 -0.25 1.6 13.6 -0.25 3.5
  [4,15,11.4,-0.25,3.5,11.4,-0.25,1.6,13.6,-0.25,1.6,13.6,-0.25,3.5],
// 4 15 11.4 -0.25 4 11.4 -0.25 3.5 13.6 -0.25 3.5 13.6 -0.25 4
  [4,15,11.4,-0.25,4,11.4,-0.25,3.5,13.6,-0.25,3.5,13.6,-0.25,4],
// 4 15 14.4 -0.25 4 13.6 -0.25 4 13.6 -0.25 3.5 14.4 -0.25 3.5
  [4,15,14.4,-0.25,4,13.6,-0.25,4,13.6,-0.25,3.5,14.4,-0.25,3.5],
// 4 15 11.4 -0.25 4 13.6 -0.25 4 13.2 -0.25 5 11.8 -0.25 5
  [4,15,11.4,-0.25,4,13.6,-0.25,4,13.2,-0.25,5,11.8,-0.25,5],
// 4 15 11.8 -0.25 5 13.2 -0.25 5 13.3 -0.25 5.8 11.7 -0.25 5.8
  [4,15,11.8,-0.25,5,13.2,-0.25,5,13.3,-0.25,5.8,11.7,-0.25,5.8],
// 3 15 14 -0.25 6.5 11.7 -0.25 5.8 13.3 -0.25 5.8
  [3,15,14,-0.25,6.5,11.7,-0.25,5.8,13.3,-0.25,5.8],
// 4 15 11.4 -0.25 3.5 11.4 -0.25 4 10.6 -0.25 4 10.6 -0.25 3.5
  [4,15,11.4,-0.25,3.5,11.4,-0.25,4,10.6,-0.25,4,10.6,-0.25,3.5],
// 4 15 8.7 -0.25 2.5 10.6 -0.25 3.5 10.6 -0.25 4 10.2 -0.25 5
  [4,15,8.7,-0.25,2.5,10.6,-0.25,3.5,10.6,-0.25,4,10.2,-0.25,5],
// 4 15 9.2 -0.25 5.5 8.7 -0.25 2.5 10.2 -0.25 5 10.3 -0.25 5.8
  [4,15,9.2,-0.25,5.5,8.7,-0.25,2.5,10.2,-0.25,5,10.3,-0.25,5.8],
// 4 15 8.9 -0.25 6.5 9.2 -0.25 5.5 10.3 -0.25 5.8 11 -0.25 6.5
  [4,15,8.9,-0.25,6.5,9.2,-0.25,5.5,10.3,-0.25,5.8,11,-0.25,6.5],
// 4 15 10.6 -0.25 1.6 10.6 -0.25 3.5 8.7 -0.25 2.5 8.7 -0.25 2
  [4,15,10.6,-0.25,1.6,10.6,-0.25,3.5,8.7,-0.25,2.5,8.7,-0.25,2],
// 4 15 8.7 -0.25 2 8.7 -0.25 2.5 6.3 -0.25 2.5 6.3 -0.25 2
  [4,15,8.7,-0.25,2,8.7,-0.25,2.5,6.3,-0.25,2.5,6.3,-0.25,2],
// 4 15 6.3 -0.25 2 6.3 -0.25 2.5 3.5 -0.25 2.3 3.5 -0.25 1.6
  [4,15,6.3,-0.25,2,6.3,-0.25,2.5,3.5,-0.25,2.3,3.5,-0.25,1.6],
// 4 15 6.3 -0.25 0.3 6.3 -0.25 2 3.5 -0.25 1.6 3.5 -0.25 0.9
  [4,15,6.3,-0.25,0.3,6.3,-0.25,2,3.5,-0.25,1.6,3.5,-0.25,0.9],
// 4 15 3.5 -0.25 1.6 3.5 -0.25 2.3 1.5 -0.25 2.3 1.5 -0.25 1.6
  [4,15,3.5,-0.25,1.6,3.5,-0.25,2.3,1.5,-0.25,2.3,1.5,-0.25,1.6],
// 4 15 4.7 -0.25 5.5 3.5 -0.25 2.3 6.3 -0.25 2.5 5.8 -0.25 5.5
  [4,15,4.7,-0.25,5.5,3.5,-0.25,2.3,6.3,-0.25,2.5,5.8,-0.25,5.5],
// 4 15 4.5 -0.25 6 4.7 -0.25 5.5 5.8 -0.25 5.5 6.1 -0.25 6.5
  [4,15,4.5,-0.25,6,4.7,-0.25,5.5,5.8,-0.25,5.5,6.1,-0.25,6.5],
// 3 15 6.1 -0.25 6.5 4 -0.25 6.5 4.5 -0.25 6
  [3,15,6.1,-0.25,6.5,4,-0.25,6.5,4.5,-0.25,6],
];
module ldraw_lib__4620858k(step=0, col=false, unit=2/5, alt=false, line=0.2, solid=!$preview)
    makepoly(ldraw_lib__4620858k(), step=step, col=col, unit=unit, alt=alt, line=line, solid=solid);
ldraw_lib__4620858k(line=0.2);
